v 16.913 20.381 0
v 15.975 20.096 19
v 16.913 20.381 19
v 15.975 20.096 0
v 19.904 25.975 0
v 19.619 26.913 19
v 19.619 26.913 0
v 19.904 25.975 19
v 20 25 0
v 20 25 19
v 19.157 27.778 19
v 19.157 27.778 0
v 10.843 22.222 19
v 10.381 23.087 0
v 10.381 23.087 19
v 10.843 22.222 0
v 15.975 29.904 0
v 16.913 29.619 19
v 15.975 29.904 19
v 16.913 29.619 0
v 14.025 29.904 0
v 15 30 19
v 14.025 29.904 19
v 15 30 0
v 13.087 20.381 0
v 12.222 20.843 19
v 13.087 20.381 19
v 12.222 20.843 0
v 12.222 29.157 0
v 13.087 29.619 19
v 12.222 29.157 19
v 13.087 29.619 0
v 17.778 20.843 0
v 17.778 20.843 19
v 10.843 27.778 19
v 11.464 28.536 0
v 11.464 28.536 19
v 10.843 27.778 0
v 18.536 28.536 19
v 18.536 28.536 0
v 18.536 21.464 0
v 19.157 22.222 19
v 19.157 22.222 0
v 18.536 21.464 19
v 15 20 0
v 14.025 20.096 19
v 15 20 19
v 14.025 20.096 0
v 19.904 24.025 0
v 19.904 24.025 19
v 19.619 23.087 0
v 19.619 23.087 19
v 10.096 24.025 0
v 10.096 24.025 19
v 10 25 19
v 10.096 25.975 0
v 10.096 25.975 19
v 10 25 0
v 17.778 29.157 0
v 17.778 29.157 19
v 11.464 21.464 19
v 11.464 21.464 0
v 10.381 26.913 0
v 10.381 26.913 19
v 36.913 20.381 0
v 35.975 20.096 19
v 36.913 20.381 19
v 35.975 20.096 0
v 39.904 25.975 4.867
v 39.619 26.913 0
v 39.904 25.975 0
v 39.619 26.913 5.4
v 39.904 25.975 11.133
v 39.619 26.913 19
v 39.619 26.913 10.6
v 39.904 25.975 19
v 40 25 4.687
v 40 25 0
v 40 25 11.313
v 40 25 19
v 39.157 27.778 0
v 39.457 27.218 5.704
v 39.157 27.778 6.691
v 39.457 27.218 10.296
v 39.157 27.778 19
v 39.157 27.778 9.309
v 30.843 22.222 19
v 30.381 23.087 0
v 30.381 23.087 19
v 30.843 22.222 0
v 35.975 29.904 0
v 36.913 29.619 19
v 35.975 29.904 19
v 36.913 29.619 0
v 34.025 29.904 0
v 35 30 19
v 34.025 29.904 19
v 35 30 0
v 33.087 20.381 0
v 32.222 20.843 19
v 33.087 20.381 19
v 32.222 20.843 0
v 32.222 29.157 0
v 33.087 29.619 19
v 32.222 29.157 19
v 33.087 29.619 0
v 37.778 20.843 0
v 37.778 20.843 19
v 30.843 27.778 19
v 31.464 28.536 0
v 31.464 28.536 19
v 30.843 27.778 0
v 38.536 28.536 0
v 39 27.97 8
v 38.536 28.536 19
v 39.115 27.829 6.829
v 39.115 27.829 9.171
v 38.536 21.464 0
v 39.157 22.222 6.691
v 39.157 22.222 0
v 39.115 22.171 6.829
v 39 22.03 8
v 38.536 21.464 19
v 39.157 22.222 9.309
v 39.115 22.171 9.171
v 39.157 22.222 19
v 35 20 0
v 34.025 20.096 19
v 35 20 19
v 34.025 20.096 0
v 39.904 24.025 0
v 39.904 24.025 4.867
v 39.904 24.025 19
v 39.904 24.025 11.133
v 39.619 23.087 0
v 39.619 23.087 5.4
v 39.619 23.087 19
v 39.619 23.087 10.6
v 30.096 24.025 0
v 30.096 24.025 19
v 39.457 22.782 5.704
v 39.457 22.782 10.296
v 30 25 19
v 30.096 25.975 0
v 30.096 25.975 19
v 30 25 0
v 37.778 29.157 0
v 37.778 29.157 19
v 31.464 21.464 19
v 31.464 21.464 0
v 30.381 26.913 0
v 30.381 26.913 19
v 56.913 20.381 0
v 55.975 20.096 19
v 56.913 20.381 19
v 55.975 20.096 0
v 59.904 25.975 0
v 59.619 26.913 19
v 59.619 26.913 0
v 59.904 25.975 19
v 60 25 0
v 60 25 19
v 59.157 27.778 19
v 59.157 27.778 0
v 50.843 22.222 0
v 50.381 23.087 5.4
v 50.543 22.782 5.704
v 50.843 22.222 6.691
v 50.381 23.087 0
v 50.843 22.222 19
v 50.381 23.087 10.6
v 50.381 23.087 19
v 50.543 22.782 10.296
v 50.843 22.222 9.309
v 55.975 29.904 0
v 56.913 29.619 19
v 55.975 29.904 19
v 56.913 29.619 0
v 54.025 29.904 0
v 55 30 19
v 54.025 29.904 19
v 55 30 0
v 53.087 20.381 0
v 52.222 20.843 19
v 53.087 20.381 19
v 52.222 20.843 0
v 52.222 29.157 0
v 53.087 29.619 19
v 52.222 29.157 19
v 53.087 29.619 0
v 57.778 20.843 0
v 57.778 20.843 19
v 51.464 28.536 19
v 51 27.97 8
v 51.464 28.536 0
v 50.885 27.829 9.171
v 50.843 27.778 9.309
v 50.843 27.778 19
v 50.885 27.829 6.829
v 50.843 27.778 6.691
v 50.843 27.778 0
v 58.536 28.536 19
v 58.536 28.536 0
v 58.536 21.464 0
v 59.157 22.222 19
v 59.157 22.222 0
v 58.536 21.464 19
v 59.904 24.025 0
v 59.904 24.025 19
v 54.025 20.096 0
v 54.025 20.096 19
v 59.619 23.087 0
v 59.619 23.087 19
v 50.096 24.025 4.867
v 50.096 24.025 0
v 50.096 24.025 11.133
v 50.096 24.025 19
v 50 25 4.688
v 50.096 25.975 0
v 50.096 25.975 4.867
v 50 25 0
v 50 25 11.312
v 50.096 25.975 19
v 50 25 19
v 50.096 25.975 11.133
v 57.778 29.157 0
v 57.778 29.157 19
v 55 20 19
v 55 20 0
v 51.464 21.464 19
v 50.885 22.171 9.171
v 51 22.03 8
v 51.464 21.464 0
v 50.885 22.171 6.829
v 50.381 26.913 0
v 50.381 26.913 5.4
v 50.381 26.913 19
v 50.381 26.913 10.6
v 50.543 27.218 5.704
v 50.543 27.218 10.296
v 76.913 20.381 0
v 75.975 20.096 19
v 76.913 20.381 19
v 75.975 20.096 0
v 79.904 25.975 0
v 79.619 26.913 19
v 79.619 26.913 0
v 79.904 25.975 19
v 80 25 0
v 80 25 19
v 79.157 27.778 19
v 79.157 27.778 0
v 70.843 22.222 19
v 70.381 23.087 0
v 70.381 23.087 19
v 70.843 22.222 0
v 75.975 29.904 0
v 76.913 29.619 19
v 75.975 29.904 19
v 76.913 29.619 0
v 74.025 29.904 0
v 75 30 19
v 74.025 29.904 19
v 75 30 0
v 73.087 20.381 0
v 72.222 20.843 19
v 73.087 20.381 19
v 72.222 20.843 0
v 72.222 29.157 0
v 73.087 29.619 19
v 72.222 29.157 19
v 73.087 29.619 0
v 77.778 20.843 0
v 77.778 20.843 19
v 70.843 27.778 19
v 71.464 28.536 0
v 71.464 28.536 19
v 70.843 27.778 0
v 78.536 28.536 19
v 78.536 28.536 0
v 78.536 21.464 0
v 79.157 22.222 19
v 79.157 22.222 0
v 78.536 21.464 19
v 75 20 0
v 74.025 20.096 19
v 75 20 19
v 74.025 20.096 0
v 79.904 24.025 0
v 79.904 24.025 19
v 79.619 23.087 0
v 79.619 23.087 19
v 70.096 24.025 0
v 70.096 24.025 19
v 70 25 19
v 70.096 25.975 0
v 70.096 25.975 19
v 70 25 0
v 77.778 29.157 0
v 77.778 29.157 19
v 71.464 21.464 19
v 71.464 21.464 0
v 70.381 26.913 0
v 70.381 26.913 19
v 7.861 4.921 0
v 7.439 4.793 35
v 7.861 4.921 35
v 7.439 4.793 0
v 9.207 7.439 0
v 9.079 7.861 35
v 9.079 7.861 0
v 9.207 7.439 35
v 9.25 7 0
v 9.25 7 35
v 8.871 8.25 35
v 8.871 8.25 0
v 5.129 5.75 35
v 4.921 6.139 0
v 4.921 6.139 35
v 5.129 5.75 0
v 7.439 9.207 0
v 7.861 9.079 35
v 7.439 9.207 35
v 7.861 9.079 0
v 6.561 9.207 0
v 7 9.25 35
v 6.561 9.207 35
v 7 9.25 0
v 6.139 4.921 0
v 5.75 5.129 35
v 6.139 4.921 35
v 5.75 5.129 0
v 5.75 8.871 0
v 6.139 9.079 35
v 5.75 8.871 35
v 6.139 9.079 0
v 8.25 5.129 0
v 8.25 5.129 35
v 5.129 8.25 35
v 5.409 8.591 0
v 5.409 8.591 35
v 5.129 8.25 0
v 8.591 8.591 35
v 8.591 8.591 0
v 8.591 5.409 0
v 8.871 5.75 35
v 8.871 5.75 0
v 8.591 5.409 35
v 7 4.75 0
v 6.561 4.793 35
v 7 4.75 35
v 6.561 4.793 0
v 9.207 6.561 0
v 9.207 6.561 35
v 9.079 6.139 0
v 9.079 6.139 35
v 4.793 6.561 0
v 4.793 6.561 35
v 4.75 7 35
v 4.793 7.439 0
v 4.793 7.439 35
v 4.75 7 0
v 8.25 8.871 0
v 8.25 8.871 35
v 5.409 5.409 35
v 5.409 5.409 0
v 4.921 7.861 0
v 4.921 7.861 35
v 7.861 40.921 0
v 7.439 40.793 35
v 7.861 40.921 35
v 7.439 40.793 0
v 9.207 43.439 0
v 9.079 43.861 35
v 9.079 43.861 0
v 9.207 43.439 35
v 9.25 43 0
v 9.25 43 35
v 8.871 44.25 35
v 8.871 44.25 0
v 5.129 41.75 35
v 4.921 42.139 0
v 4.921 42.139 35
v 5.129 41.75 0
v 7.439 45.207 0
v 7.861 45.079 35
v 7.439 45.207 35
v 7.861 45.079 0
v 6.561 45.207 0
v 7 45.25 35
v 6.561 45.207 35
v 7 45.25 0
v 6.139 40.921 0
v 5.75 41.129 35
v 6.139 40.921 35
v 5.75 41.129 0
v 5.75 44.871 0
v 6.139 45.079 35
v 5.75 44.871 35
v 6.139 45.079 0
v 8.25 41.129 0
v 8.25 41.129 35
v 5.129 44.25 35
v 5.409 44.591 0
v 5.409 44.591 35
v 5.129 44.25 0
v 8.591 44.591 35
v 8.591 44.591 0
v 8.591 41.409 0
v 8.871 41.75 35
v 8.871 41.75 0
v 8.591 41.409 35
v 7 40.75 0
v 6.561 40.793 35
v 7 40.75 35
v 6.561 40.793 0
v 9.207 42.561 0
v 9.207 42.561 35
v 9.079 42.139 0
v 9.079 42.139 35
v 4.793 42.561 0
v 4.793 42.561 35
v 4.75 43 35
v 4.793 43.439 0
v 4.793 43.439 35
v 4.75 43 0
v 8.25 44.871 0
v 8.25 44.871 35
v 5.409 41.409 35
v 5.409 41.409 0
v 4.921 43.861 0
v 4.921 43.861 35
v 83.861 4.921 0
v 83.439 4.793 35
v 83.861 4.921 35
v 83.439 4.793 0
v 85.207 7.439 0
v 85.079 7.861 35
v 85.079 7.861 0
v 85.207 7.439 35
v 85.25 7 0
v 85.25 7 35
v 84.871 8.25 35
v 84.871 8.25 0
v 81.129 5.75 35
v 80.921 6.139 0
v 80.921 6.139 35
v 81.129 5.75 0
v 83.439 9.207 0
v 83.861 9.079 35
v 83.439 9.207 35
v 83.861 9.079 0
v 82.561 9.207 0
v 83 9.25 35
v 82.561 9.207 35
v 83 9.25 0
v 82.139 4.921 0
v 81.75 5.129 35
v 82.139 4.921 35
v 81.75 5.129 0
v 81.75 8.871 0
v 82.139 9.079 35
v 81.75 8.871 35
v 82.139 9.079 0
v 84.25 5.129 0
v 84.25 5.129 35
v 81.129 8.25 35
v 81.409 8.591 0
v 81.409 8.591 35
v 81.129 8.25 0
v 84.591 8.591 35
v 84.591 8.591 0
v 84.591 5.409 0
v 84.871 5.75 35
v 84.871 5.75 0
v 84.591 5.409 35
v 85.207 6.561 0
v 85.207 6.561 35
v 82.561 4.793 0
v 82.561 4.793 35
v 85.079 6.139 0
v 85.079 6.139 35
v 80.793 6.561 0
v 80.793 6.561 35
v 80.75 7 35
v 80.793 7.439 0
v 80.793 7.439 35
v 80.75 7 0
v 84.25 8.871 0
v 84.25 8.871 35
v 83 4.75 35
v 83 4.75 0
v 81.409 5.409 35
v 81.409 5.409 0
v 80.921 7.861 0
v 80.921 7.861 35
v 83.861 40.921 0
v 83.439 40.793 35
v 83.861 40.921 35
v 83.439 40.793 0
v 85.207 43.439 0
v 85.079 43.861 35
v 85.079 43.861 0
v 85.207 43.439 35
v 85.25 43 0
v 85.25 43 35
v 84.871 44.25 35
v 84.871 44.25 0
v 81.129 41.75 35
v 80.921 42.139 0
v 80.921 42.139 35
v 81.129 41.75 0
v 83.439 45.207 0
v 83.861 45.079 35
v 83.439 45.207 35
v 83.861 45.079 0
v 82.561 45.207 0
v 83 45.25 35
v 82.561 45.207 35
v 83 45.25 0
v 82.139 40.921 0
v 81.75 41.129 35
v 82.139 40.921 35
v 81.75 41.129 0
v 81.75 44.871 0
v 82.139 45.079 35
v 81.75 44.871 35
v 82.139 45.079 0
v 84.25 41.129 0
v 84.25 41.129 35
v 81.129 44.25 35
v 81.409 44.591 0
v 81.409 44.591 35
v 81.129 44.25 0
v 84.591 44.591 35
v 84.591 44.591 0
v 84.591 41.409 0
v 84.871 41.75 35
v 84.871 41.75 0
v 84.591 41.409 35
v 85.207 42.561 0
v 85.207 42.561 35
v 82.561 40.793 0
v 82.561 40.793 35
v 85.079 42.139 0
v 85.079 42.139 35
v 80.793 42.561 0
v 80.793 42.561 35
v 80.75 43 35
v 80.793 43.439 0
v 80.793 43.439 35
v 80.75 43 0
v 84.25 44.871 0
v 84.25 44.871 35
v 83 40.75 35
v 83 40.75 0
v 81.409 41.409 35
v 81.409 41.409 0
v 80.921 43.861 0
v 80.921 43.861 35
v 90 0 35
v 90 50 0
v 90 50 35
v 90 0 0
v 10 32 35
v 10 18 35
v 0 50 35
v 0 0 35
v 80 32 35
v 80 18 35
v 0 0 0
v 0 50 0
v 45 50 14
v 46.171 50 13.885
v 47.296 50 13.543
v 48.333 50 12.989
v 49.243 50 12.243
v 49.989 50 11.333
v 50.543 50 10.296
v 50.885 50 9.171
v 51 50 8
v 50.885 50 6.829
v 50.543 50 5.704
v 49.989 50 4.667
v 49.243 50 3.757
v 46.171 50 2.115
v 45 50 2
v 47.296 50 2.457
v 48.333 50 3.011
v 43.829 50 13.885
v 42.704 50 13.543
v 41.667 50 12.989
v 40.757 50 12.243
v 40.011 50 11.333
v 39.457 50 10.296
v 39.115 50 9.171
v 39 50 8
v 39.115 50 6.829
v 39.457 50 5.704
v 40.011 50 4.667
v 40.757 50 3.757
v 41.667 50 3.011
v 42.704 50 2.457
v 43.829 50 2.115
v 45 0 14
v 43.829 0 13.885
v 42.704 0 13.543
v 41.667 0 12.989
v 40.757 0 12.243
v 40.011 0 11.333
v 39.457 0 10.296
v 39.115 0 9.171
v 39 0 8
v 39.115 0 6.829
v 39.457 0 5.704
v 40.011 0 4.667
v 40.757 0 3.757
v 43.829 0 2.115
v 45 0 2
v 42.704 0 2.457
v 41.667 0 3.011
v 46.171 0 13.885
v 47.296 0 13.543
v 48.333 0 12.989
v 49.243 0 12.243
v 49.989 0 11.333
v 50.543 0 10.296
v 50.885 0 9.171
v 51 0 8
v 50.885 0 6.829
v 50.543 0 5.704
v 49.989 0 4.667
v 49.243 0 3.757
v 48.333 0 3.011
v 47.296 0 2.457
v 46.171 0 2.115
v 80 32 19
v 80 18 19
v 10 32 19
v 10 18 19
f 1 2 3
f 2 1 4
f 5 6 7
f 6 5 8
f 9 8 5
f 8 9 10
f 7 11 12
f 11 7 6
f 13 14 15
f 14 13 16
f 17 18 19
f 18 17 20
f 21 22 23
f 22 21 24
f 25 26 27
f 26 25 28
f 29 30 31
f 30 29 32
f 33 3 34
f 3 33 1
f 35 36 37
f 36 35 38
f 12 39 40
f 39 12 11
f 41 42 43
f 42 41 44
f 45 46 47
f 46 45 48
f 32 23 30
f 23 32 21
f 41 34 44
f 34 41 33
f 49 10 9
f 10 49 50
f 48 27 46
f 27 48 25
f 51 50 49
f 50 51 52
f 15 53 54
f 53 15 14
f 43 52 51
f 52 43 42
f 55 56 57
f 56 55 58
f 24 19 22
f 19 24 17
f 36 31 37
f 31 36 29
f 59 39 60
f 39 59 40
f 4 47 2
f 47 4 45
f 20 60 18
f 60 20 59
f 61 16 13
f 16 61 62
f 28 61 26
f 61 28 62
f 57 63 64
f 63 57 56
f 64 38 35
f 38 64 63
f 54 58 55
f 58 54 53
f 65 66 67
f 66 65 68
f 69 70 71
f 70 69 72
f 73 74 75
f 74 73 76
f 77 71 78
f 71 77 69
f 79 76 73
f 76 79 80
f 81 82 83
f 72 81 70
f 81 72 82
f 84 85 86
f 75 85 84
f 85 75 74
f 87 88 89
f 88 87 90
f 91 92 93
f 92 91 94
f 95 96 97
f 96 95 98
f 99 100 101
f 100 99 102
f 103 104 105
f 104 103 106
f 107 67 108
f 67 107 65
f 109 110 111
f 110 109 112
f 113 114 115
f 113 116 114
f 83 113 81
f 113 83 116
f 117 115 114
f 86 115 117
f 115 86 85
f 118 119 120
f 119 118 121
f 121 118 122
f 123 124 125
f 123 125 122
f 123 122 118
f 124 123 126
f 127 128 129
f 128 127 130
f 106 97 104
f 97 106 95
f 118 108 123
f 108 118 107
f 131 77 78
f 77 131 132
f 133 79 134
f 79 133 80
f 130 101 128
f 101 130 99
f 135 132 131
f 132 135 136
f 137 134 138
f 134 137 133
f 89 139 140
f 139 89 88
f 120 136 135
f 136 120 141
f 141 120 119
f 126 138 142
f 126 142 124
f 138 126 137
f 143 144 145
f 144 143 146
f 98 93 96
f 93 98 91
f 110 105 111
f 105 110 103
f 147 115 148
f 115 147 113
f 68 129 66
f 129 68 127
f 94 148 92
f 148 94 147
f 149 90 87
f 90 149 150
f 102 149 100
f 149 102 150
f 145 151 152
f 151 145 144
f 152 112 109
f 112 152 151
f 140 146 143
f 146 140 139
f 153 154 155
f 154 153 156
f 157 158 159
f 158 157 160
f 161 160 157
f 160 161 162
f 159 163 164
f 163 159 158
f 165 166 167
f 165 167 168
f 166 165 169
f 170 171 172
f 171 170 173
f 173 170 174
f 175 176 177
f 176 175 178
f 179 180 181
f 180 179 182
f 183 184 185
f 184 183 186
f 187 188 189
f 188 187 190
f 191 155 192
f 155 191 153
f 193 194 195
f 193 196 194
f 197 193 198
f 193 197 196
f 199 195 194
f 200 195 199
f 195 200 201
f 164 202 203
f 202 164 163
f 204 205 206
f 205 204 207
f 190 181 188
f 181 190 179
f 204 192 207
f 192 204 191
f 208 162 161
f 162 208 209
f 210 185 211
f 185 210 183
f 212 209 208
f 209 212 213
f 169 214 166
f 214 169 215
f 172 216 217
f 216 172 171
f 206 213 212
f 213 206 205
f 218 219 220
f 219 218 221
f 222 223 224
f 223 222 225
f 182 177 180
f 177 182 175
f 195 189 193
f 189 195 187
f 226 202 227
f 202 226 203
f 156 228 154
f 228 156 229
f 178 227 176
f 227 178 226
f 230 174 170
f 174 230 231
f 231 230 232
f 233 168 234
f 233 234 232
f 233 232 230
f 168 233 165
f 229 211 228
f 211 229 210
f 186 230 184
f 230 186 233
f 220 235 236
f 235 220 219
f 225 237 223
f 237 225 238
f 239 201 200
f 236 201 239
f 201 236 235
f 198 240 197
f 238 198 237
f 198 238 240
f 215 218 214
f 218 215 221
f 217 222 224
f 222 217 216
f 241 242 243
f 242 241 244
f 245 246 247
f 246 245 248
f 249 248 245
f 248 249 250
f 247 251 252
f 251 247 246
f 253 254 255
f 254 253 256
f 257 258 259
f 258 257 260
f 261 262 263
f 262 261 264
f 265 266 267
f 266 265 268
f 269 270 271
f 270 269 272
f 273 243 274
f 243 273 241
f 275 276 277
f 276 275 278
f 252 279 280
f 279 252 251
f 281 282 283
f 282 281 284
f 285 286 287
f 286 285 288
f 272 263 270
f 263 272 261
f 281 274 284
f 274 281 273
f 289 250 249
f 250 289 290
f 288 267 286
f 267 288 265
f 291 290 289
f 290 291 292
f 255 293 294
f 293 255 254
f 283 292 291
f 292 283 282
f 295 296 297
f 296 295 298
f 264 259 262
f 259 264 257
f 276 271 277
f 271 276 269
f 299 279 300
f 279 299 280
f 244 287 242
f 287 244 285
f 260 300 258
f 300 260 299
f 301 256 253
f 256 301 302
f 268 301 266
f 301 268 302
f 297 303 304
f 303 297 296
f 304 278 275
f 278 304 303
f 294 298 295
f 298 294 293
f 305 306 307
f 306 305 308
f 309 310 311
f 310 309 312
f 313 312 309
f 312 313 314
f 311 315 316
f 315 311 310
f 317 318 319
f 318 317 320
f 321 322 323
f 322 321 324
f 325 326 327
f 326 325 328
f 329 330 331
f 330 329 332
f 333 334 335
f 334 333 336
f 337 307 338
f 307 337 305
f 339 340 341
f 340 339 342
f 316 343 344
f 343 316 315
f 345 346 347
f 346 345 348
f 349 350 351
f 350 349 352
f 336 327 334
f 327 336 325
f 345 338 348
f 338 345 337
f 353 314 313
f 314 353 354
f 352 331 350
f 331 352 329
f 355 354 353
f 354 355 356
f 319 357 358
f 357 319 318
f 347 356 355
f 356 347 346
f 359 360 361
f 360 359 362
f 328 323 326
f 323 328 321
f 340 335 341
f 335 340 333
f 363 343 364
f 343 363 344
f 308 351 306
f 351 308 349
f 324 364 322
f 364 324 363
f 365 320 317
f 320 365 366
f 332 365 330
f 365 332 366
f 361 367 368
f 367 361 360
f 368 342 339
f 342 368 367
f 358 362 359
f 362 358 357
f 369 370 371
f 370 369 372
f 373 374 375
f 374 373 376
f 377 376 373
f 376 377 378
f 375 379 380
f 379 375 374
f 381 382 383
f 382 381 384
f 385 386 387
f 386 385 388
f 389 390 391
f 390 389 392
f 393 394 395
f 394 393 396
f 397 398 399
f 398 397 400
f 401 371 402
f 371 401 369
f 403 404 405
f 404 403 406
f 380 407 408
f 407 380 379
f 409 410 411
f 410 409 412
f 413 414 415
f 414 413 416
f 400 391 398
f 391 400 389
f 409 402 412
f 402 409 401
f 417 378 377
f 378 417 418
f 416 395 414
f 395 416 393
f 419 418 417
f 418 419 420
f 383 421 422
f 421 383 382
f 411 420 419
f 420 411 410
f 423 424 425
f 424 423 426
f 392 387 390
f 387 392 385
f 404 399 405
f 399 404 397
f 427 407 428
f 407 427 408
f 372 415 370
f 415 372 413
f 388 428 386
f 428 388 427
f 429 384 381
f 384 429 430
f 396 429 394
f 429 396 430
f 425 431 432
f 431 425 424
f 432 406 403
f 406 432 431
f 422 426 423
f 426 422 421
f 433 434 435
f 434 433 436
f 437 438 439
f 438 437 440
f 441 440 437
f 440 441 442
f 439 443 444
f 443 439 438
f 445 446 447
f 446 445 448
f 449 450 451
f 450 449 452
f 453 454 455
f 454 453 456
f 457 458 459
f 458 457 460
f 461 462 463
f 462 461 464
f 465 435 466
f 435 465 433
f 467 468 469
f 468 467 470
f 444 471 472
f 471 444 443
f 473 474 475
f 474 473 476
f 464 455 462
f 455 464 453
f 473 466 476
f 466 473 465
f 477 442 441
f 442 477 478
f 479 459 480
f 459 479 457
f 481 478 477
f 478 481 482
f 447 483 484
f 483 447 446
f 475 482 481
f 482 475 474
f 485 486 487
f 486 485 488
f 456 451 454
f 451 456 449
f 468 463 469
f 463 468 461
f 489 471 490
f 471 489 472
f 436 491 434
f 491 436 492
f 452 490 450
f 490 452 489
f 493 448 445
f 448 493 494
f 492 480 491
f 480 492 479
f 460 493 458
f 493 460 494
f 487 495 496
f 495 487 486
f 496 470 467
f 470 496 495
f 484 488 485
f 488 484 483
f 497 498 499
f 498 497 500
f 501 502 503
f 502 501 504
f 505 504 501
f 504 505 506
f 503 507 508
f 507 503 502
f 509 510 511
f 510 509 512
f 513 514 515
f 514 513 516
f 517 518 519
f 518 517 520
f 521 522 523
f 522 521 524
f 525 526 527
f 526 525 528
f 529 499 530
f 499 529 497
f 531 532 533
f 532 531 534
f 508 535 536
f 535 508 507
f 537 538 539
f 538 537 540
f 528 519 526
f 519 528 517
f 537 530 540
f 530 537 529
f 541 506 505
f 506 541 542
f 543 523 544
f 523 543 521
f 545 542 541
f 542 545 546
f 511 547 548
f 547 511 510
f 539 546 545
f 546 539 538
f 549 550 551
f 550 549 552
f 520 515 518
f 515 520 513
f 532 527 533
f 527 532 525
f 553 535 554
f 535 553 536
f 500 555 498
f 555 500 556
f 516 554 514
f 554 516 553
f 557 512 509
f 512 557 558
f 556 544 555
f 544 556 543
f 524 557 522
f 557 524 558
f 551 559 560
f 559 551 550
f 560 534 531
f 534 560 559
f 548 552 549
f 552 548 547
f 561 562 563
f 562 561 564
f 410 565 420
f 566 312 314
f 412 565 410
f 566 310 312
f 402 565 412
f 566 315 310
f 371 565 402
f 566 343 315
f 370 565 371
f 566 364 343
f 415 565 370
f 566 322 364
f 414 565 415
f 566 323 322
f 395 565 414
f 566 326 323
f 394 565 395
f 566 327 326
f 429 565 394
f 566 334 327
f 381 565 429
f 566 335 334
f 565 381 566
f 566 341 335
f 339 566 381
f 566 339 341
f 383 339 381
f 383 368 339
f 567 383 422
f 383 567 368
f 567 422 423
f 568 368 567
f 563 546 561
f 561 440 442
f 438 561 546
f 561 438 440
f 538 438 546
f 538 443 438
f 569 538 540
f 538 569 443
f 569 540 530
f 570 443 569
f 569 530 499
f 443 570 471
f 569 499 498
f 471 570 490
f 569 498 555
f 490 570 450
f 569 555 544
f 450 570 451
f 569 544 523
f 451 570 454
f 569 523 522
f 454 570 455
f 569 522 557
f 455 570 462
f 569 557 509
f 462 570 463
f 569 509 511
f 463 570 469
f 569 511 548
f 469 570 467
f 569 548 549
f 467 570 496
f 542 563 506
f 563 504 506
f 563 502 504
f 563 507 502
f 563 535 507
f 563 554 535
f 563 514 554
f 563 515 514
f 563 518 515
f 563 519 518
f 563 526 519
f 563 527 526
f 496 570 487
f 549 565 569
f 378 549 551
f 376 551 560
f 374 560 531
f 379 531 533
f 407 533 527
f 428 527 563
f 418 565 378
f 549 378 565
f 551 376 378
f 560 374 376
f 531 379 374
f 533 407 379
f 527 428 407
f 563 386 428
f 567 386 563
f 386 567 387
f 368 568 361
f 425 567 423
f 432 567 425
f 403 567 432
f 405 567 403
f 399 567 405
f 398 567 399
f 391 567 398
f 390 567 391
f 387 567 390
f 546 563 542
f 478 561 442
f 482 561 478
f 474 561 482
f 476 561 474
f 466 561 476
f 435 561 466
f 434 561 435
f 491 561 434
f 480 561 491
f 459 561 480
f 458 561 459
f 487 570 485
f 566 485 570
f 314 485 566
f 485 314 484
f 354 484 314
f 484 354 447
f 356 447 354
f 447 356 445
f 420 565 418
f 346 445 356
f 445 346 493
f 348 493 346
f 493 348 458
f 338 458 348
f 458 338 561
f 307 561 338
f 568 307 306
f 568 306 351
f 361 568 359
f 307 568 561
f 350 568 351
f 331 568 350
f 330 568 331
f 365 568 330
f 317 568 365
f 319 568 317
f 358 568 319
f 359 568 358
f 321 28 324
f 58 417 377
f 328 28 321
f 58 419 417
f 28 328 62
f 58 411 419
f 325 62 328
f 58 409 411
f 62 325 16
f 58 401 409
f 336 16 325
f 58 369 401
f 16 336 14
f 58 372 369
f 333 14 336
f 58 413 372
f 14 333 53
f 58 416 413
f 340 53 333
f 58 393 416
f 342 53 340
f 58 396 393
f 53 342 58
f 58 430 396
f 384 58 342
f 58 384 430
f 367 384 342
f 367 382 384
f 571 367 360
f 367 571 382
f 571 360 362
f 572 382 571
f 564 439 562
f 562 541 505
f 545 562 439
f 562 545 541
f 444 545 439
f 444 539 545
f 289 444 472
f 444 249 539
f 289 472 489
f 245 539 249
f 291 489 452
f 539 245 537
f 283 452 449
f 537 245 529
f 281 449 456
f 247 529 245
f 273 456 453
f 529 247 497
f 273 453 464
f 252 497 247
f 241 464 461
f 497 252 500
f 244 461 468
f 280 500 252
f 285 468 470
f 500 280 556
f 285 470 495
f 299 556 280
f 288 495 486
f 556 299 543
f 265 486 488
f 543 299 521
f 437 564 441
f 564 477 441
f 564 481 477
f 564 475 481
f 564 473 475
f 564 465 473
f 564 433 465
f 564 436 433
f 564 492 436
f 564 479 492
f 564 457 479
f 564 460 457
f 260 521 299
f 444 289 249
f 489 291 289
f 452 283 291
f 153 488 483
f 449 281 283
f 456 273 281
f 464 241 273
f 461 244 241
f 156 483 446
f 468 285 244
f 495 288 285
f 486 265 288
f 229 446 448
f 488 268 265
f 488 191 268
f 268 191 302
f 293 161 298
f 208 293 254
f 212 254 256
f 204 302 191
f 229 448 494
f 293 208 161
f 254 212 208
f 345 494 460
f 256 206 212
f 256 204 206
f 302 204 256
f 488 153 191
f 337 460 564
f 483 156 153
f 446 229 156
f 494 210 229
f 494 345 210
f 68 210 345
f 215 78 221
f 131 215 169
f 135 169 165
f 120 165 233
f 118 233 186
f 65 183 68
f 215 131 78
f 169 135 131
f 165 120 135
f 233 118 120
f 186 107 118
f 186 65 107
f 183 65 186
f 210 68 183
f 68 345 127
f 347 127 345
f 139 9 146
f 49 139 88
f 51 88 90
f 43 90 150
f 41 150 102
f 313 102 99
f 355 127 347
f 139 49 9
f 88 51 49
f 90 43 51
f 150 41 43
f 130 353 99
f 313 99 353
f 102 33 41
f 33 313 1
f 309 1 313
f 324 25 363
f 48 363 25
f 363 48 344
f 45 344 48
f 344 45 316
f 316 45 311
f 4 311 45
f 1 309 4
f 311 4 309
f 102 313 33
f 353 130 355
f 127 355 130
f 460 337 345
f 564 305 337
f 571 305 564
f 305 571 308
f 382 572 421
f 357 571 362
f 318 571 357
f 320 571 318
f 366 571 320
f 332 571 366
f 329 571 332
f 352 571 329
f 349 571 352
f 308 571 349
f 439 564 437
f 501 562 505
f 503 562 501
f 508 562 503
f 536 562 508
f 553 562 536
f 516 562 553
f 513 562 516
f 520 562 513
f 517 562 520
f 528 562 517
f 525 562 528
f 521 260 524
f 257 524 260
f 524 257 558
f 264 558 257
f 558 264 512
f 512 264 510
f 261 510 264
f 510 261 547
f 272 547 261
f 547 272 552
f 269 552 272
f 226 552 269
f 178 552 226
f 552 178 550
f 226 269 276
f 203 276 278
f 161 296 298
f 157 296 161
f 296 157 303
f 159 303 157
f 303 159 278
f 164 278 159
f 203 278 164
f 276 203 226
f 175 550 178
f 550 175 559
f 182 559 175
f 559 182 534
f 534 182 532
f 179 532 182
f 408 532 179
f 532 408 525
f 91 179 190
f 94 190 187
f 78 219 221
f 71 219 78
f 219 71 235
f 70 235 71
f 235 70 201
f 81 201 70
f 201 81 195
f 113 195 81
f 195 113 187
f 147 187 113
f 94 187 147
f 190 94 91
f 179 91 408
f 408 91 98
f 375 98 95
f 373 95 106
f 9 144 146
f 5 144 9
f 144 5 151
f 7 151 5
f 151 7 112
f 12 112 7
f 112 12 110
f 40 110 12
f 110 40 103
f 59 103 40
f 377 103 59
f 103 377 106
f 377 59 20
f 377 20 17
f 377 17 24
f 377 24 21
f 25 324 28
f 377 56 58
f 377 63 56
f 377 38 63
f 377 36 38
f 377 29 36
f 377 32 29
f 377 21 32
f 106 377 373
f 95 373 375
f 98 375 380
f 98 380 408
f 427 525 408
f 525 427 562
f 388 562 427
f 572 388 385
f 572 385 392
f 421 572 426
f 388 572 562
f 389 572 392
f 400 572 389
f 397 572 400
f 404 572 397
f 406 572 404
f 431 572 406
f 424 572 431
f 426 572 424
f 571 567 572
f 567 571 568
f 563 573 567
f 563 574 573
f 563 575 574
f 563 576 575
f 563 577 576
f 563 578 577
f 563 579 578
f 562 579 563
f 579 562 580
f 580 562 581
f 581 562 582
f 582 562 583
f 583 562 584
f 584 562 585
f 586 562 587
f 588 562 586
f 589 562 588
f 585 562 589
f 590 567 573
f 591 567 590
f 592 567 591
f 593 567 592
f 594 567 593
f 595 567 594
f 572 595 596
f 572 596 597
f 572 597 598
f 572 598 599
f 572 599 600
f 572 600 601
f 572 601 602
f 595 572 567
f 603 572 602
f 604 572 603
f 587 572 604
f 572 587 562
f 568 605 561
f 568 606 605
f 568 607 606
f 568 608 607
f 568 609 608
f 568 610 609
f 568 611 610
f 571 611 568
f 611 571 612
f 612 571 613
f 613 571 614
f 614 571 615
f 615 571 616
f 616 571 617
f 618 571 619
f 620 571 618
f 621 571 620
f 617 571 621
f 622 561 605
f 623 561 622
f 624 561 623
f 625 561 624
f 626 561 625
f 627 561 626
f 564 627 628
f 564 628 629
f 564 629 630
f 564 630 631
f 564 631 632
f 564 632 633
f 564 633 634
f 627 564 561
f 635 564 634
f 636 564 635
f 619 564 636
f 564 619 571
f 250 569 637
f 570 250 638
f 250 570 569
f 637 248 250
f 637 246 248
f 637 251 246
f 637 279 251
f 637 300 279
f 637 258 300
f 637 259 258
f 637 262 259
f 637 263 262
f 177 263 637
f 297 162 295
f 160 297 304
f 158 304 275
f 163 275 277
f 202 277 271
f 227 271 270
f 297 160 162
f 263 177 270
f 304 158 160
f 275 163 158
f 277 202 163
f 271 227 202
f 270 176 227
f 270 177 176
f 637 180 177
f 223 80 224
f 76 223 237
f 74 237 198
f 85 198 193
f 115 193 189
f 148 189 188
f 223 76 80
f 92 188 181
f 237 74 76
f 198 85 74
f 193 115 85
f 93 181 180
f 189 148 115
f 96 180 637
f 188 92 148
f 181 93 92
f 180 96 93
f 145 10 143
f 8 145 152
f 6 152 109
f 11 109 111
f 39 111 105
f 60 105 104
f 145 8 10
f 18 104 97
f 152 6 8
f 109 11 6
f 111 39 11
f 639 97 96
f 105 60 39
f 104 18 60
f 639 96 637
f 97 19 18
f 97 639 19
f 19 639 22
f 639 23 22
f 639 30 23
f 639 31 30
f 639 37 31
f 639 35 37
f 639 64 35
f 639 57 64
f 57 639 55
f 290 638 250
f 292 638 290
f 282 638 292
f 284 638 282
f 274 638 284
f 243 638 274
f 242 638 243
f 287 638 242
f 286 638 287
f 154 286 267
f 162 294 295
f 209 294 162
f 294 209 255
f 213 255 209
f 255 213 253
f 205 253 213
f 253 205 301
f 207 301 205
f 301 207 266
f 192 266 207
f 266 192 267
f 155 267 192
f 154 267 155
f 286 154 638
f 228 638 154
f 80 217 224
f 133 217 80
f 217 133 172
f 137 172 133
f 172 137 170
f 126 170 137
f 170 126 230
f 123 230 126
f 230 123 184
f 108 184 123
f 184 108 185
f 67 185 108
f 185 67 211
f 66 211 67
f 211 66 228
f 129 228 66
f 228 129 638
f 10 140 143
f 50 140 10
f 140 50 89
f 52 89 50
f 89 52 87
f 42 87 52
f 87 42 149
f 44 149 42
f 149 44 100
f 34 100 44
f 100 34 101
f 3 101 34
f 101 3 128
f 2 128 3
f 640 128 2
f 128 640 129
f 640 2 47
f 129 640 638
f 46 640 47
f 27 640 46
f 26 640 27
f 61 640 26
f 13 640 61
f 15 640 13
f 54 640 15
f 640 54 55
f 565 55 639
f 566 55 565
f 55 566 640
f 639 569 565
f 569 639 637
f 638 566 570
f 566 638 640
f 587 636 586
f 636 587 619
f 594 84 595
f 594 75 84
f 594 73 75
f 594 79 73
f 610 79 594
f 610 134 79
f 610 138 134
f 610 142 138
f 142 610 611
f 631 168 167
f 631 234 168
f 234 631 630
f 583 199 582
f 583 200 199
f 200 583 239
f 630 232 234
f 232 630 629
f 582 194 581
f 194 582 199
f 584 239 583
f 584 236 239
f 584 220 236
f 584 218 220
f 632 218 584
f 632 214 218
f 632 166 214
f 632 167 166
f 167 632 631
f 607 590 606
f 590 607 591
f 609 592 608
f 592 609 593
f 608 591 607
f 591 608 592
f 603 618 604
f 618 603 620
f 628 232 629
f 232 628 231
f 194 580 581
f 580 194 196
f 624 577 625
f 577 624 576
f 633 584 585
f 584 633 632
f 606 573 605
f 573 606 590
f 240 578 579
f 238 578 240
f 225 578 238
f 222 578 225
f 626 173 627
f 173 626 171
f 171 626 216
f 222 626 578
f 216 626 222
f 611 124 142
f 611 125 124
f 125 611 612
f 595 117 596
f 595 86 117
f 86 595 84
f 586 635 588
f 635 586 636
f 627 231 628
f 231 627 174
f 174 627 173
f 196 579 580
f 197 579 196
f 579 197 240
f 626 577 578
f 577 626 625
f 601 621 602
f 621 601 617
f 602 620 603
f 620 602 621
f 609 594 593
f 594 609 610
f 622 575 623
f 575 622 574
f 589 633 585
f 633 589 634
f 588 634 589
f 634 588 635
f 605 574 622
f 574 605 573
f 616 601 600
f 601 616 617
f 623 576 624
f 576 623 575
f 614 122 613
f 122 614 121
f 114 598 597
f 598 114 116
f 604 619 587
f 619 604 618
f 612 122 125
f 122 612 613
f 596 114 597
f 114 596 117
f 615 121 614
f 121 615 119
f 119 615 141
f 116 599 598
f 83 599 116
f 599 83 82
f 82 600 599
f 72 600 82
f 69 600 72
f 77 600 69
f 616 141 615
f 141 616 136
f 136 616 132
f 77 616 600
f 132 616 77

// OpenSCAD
$fn = 32;

// ----------------------------------------------------------------------
// Manifold block: side_outlet manifold
// ----------------------------------------------------------------------

// --- parameters (mm) ---
block_l = 90;             // block length, X
block_w = 50;             // block width, Y
block_h = 35;             // block height, Z
port_d = 10;              // port bore diameter
port_pitch = 20;          // port pitch along X
gallery_d = 14;           // top gallery width, Y
gallery_depth = 16;       // gallery pocket depth
wall_p = 10;              // gallery end wall thickness, X
mnt_d = 4.5;              // mounting hole diameter
mnt_in = 7;               // mounting hole inset from the edges
out_d = 12;               // outlet bore diameter
out_z = 8;                // outlet axis height

n_ports = 4;  // ports in the row
port_x0 = (block_l - (n_ports - 1) * port_pitch) / 2;  // first port X

difference() {
  cube([block_l, block_w, block_h]);
  for (i = [0 : n_ports - 1])
    translate([port_x0 + i * port_pitch, block_w / 2, -1])
      cylinder(h = block_h + 2, d = port_d);
  translate([wall_p, block_w / 2 - gallery_d / 2, block_h - gallery_depth])
    cube([block_l - 2 * wall_p, gallery_d, gallery_depth + 1]);
  for (cx = [mnt_in, block_l - mnt_in])
    for (cy = [mnt_in, block_w - mnt_in])
      translate([cx, cy, -1]) cylinder(h = block_h + 2, d = mnt_d);
  translate([block_l / 2, -1, out_z]) rotate([-90, 0, 0])
    cylinder(h = block_w + 2, d = out_d);
}
